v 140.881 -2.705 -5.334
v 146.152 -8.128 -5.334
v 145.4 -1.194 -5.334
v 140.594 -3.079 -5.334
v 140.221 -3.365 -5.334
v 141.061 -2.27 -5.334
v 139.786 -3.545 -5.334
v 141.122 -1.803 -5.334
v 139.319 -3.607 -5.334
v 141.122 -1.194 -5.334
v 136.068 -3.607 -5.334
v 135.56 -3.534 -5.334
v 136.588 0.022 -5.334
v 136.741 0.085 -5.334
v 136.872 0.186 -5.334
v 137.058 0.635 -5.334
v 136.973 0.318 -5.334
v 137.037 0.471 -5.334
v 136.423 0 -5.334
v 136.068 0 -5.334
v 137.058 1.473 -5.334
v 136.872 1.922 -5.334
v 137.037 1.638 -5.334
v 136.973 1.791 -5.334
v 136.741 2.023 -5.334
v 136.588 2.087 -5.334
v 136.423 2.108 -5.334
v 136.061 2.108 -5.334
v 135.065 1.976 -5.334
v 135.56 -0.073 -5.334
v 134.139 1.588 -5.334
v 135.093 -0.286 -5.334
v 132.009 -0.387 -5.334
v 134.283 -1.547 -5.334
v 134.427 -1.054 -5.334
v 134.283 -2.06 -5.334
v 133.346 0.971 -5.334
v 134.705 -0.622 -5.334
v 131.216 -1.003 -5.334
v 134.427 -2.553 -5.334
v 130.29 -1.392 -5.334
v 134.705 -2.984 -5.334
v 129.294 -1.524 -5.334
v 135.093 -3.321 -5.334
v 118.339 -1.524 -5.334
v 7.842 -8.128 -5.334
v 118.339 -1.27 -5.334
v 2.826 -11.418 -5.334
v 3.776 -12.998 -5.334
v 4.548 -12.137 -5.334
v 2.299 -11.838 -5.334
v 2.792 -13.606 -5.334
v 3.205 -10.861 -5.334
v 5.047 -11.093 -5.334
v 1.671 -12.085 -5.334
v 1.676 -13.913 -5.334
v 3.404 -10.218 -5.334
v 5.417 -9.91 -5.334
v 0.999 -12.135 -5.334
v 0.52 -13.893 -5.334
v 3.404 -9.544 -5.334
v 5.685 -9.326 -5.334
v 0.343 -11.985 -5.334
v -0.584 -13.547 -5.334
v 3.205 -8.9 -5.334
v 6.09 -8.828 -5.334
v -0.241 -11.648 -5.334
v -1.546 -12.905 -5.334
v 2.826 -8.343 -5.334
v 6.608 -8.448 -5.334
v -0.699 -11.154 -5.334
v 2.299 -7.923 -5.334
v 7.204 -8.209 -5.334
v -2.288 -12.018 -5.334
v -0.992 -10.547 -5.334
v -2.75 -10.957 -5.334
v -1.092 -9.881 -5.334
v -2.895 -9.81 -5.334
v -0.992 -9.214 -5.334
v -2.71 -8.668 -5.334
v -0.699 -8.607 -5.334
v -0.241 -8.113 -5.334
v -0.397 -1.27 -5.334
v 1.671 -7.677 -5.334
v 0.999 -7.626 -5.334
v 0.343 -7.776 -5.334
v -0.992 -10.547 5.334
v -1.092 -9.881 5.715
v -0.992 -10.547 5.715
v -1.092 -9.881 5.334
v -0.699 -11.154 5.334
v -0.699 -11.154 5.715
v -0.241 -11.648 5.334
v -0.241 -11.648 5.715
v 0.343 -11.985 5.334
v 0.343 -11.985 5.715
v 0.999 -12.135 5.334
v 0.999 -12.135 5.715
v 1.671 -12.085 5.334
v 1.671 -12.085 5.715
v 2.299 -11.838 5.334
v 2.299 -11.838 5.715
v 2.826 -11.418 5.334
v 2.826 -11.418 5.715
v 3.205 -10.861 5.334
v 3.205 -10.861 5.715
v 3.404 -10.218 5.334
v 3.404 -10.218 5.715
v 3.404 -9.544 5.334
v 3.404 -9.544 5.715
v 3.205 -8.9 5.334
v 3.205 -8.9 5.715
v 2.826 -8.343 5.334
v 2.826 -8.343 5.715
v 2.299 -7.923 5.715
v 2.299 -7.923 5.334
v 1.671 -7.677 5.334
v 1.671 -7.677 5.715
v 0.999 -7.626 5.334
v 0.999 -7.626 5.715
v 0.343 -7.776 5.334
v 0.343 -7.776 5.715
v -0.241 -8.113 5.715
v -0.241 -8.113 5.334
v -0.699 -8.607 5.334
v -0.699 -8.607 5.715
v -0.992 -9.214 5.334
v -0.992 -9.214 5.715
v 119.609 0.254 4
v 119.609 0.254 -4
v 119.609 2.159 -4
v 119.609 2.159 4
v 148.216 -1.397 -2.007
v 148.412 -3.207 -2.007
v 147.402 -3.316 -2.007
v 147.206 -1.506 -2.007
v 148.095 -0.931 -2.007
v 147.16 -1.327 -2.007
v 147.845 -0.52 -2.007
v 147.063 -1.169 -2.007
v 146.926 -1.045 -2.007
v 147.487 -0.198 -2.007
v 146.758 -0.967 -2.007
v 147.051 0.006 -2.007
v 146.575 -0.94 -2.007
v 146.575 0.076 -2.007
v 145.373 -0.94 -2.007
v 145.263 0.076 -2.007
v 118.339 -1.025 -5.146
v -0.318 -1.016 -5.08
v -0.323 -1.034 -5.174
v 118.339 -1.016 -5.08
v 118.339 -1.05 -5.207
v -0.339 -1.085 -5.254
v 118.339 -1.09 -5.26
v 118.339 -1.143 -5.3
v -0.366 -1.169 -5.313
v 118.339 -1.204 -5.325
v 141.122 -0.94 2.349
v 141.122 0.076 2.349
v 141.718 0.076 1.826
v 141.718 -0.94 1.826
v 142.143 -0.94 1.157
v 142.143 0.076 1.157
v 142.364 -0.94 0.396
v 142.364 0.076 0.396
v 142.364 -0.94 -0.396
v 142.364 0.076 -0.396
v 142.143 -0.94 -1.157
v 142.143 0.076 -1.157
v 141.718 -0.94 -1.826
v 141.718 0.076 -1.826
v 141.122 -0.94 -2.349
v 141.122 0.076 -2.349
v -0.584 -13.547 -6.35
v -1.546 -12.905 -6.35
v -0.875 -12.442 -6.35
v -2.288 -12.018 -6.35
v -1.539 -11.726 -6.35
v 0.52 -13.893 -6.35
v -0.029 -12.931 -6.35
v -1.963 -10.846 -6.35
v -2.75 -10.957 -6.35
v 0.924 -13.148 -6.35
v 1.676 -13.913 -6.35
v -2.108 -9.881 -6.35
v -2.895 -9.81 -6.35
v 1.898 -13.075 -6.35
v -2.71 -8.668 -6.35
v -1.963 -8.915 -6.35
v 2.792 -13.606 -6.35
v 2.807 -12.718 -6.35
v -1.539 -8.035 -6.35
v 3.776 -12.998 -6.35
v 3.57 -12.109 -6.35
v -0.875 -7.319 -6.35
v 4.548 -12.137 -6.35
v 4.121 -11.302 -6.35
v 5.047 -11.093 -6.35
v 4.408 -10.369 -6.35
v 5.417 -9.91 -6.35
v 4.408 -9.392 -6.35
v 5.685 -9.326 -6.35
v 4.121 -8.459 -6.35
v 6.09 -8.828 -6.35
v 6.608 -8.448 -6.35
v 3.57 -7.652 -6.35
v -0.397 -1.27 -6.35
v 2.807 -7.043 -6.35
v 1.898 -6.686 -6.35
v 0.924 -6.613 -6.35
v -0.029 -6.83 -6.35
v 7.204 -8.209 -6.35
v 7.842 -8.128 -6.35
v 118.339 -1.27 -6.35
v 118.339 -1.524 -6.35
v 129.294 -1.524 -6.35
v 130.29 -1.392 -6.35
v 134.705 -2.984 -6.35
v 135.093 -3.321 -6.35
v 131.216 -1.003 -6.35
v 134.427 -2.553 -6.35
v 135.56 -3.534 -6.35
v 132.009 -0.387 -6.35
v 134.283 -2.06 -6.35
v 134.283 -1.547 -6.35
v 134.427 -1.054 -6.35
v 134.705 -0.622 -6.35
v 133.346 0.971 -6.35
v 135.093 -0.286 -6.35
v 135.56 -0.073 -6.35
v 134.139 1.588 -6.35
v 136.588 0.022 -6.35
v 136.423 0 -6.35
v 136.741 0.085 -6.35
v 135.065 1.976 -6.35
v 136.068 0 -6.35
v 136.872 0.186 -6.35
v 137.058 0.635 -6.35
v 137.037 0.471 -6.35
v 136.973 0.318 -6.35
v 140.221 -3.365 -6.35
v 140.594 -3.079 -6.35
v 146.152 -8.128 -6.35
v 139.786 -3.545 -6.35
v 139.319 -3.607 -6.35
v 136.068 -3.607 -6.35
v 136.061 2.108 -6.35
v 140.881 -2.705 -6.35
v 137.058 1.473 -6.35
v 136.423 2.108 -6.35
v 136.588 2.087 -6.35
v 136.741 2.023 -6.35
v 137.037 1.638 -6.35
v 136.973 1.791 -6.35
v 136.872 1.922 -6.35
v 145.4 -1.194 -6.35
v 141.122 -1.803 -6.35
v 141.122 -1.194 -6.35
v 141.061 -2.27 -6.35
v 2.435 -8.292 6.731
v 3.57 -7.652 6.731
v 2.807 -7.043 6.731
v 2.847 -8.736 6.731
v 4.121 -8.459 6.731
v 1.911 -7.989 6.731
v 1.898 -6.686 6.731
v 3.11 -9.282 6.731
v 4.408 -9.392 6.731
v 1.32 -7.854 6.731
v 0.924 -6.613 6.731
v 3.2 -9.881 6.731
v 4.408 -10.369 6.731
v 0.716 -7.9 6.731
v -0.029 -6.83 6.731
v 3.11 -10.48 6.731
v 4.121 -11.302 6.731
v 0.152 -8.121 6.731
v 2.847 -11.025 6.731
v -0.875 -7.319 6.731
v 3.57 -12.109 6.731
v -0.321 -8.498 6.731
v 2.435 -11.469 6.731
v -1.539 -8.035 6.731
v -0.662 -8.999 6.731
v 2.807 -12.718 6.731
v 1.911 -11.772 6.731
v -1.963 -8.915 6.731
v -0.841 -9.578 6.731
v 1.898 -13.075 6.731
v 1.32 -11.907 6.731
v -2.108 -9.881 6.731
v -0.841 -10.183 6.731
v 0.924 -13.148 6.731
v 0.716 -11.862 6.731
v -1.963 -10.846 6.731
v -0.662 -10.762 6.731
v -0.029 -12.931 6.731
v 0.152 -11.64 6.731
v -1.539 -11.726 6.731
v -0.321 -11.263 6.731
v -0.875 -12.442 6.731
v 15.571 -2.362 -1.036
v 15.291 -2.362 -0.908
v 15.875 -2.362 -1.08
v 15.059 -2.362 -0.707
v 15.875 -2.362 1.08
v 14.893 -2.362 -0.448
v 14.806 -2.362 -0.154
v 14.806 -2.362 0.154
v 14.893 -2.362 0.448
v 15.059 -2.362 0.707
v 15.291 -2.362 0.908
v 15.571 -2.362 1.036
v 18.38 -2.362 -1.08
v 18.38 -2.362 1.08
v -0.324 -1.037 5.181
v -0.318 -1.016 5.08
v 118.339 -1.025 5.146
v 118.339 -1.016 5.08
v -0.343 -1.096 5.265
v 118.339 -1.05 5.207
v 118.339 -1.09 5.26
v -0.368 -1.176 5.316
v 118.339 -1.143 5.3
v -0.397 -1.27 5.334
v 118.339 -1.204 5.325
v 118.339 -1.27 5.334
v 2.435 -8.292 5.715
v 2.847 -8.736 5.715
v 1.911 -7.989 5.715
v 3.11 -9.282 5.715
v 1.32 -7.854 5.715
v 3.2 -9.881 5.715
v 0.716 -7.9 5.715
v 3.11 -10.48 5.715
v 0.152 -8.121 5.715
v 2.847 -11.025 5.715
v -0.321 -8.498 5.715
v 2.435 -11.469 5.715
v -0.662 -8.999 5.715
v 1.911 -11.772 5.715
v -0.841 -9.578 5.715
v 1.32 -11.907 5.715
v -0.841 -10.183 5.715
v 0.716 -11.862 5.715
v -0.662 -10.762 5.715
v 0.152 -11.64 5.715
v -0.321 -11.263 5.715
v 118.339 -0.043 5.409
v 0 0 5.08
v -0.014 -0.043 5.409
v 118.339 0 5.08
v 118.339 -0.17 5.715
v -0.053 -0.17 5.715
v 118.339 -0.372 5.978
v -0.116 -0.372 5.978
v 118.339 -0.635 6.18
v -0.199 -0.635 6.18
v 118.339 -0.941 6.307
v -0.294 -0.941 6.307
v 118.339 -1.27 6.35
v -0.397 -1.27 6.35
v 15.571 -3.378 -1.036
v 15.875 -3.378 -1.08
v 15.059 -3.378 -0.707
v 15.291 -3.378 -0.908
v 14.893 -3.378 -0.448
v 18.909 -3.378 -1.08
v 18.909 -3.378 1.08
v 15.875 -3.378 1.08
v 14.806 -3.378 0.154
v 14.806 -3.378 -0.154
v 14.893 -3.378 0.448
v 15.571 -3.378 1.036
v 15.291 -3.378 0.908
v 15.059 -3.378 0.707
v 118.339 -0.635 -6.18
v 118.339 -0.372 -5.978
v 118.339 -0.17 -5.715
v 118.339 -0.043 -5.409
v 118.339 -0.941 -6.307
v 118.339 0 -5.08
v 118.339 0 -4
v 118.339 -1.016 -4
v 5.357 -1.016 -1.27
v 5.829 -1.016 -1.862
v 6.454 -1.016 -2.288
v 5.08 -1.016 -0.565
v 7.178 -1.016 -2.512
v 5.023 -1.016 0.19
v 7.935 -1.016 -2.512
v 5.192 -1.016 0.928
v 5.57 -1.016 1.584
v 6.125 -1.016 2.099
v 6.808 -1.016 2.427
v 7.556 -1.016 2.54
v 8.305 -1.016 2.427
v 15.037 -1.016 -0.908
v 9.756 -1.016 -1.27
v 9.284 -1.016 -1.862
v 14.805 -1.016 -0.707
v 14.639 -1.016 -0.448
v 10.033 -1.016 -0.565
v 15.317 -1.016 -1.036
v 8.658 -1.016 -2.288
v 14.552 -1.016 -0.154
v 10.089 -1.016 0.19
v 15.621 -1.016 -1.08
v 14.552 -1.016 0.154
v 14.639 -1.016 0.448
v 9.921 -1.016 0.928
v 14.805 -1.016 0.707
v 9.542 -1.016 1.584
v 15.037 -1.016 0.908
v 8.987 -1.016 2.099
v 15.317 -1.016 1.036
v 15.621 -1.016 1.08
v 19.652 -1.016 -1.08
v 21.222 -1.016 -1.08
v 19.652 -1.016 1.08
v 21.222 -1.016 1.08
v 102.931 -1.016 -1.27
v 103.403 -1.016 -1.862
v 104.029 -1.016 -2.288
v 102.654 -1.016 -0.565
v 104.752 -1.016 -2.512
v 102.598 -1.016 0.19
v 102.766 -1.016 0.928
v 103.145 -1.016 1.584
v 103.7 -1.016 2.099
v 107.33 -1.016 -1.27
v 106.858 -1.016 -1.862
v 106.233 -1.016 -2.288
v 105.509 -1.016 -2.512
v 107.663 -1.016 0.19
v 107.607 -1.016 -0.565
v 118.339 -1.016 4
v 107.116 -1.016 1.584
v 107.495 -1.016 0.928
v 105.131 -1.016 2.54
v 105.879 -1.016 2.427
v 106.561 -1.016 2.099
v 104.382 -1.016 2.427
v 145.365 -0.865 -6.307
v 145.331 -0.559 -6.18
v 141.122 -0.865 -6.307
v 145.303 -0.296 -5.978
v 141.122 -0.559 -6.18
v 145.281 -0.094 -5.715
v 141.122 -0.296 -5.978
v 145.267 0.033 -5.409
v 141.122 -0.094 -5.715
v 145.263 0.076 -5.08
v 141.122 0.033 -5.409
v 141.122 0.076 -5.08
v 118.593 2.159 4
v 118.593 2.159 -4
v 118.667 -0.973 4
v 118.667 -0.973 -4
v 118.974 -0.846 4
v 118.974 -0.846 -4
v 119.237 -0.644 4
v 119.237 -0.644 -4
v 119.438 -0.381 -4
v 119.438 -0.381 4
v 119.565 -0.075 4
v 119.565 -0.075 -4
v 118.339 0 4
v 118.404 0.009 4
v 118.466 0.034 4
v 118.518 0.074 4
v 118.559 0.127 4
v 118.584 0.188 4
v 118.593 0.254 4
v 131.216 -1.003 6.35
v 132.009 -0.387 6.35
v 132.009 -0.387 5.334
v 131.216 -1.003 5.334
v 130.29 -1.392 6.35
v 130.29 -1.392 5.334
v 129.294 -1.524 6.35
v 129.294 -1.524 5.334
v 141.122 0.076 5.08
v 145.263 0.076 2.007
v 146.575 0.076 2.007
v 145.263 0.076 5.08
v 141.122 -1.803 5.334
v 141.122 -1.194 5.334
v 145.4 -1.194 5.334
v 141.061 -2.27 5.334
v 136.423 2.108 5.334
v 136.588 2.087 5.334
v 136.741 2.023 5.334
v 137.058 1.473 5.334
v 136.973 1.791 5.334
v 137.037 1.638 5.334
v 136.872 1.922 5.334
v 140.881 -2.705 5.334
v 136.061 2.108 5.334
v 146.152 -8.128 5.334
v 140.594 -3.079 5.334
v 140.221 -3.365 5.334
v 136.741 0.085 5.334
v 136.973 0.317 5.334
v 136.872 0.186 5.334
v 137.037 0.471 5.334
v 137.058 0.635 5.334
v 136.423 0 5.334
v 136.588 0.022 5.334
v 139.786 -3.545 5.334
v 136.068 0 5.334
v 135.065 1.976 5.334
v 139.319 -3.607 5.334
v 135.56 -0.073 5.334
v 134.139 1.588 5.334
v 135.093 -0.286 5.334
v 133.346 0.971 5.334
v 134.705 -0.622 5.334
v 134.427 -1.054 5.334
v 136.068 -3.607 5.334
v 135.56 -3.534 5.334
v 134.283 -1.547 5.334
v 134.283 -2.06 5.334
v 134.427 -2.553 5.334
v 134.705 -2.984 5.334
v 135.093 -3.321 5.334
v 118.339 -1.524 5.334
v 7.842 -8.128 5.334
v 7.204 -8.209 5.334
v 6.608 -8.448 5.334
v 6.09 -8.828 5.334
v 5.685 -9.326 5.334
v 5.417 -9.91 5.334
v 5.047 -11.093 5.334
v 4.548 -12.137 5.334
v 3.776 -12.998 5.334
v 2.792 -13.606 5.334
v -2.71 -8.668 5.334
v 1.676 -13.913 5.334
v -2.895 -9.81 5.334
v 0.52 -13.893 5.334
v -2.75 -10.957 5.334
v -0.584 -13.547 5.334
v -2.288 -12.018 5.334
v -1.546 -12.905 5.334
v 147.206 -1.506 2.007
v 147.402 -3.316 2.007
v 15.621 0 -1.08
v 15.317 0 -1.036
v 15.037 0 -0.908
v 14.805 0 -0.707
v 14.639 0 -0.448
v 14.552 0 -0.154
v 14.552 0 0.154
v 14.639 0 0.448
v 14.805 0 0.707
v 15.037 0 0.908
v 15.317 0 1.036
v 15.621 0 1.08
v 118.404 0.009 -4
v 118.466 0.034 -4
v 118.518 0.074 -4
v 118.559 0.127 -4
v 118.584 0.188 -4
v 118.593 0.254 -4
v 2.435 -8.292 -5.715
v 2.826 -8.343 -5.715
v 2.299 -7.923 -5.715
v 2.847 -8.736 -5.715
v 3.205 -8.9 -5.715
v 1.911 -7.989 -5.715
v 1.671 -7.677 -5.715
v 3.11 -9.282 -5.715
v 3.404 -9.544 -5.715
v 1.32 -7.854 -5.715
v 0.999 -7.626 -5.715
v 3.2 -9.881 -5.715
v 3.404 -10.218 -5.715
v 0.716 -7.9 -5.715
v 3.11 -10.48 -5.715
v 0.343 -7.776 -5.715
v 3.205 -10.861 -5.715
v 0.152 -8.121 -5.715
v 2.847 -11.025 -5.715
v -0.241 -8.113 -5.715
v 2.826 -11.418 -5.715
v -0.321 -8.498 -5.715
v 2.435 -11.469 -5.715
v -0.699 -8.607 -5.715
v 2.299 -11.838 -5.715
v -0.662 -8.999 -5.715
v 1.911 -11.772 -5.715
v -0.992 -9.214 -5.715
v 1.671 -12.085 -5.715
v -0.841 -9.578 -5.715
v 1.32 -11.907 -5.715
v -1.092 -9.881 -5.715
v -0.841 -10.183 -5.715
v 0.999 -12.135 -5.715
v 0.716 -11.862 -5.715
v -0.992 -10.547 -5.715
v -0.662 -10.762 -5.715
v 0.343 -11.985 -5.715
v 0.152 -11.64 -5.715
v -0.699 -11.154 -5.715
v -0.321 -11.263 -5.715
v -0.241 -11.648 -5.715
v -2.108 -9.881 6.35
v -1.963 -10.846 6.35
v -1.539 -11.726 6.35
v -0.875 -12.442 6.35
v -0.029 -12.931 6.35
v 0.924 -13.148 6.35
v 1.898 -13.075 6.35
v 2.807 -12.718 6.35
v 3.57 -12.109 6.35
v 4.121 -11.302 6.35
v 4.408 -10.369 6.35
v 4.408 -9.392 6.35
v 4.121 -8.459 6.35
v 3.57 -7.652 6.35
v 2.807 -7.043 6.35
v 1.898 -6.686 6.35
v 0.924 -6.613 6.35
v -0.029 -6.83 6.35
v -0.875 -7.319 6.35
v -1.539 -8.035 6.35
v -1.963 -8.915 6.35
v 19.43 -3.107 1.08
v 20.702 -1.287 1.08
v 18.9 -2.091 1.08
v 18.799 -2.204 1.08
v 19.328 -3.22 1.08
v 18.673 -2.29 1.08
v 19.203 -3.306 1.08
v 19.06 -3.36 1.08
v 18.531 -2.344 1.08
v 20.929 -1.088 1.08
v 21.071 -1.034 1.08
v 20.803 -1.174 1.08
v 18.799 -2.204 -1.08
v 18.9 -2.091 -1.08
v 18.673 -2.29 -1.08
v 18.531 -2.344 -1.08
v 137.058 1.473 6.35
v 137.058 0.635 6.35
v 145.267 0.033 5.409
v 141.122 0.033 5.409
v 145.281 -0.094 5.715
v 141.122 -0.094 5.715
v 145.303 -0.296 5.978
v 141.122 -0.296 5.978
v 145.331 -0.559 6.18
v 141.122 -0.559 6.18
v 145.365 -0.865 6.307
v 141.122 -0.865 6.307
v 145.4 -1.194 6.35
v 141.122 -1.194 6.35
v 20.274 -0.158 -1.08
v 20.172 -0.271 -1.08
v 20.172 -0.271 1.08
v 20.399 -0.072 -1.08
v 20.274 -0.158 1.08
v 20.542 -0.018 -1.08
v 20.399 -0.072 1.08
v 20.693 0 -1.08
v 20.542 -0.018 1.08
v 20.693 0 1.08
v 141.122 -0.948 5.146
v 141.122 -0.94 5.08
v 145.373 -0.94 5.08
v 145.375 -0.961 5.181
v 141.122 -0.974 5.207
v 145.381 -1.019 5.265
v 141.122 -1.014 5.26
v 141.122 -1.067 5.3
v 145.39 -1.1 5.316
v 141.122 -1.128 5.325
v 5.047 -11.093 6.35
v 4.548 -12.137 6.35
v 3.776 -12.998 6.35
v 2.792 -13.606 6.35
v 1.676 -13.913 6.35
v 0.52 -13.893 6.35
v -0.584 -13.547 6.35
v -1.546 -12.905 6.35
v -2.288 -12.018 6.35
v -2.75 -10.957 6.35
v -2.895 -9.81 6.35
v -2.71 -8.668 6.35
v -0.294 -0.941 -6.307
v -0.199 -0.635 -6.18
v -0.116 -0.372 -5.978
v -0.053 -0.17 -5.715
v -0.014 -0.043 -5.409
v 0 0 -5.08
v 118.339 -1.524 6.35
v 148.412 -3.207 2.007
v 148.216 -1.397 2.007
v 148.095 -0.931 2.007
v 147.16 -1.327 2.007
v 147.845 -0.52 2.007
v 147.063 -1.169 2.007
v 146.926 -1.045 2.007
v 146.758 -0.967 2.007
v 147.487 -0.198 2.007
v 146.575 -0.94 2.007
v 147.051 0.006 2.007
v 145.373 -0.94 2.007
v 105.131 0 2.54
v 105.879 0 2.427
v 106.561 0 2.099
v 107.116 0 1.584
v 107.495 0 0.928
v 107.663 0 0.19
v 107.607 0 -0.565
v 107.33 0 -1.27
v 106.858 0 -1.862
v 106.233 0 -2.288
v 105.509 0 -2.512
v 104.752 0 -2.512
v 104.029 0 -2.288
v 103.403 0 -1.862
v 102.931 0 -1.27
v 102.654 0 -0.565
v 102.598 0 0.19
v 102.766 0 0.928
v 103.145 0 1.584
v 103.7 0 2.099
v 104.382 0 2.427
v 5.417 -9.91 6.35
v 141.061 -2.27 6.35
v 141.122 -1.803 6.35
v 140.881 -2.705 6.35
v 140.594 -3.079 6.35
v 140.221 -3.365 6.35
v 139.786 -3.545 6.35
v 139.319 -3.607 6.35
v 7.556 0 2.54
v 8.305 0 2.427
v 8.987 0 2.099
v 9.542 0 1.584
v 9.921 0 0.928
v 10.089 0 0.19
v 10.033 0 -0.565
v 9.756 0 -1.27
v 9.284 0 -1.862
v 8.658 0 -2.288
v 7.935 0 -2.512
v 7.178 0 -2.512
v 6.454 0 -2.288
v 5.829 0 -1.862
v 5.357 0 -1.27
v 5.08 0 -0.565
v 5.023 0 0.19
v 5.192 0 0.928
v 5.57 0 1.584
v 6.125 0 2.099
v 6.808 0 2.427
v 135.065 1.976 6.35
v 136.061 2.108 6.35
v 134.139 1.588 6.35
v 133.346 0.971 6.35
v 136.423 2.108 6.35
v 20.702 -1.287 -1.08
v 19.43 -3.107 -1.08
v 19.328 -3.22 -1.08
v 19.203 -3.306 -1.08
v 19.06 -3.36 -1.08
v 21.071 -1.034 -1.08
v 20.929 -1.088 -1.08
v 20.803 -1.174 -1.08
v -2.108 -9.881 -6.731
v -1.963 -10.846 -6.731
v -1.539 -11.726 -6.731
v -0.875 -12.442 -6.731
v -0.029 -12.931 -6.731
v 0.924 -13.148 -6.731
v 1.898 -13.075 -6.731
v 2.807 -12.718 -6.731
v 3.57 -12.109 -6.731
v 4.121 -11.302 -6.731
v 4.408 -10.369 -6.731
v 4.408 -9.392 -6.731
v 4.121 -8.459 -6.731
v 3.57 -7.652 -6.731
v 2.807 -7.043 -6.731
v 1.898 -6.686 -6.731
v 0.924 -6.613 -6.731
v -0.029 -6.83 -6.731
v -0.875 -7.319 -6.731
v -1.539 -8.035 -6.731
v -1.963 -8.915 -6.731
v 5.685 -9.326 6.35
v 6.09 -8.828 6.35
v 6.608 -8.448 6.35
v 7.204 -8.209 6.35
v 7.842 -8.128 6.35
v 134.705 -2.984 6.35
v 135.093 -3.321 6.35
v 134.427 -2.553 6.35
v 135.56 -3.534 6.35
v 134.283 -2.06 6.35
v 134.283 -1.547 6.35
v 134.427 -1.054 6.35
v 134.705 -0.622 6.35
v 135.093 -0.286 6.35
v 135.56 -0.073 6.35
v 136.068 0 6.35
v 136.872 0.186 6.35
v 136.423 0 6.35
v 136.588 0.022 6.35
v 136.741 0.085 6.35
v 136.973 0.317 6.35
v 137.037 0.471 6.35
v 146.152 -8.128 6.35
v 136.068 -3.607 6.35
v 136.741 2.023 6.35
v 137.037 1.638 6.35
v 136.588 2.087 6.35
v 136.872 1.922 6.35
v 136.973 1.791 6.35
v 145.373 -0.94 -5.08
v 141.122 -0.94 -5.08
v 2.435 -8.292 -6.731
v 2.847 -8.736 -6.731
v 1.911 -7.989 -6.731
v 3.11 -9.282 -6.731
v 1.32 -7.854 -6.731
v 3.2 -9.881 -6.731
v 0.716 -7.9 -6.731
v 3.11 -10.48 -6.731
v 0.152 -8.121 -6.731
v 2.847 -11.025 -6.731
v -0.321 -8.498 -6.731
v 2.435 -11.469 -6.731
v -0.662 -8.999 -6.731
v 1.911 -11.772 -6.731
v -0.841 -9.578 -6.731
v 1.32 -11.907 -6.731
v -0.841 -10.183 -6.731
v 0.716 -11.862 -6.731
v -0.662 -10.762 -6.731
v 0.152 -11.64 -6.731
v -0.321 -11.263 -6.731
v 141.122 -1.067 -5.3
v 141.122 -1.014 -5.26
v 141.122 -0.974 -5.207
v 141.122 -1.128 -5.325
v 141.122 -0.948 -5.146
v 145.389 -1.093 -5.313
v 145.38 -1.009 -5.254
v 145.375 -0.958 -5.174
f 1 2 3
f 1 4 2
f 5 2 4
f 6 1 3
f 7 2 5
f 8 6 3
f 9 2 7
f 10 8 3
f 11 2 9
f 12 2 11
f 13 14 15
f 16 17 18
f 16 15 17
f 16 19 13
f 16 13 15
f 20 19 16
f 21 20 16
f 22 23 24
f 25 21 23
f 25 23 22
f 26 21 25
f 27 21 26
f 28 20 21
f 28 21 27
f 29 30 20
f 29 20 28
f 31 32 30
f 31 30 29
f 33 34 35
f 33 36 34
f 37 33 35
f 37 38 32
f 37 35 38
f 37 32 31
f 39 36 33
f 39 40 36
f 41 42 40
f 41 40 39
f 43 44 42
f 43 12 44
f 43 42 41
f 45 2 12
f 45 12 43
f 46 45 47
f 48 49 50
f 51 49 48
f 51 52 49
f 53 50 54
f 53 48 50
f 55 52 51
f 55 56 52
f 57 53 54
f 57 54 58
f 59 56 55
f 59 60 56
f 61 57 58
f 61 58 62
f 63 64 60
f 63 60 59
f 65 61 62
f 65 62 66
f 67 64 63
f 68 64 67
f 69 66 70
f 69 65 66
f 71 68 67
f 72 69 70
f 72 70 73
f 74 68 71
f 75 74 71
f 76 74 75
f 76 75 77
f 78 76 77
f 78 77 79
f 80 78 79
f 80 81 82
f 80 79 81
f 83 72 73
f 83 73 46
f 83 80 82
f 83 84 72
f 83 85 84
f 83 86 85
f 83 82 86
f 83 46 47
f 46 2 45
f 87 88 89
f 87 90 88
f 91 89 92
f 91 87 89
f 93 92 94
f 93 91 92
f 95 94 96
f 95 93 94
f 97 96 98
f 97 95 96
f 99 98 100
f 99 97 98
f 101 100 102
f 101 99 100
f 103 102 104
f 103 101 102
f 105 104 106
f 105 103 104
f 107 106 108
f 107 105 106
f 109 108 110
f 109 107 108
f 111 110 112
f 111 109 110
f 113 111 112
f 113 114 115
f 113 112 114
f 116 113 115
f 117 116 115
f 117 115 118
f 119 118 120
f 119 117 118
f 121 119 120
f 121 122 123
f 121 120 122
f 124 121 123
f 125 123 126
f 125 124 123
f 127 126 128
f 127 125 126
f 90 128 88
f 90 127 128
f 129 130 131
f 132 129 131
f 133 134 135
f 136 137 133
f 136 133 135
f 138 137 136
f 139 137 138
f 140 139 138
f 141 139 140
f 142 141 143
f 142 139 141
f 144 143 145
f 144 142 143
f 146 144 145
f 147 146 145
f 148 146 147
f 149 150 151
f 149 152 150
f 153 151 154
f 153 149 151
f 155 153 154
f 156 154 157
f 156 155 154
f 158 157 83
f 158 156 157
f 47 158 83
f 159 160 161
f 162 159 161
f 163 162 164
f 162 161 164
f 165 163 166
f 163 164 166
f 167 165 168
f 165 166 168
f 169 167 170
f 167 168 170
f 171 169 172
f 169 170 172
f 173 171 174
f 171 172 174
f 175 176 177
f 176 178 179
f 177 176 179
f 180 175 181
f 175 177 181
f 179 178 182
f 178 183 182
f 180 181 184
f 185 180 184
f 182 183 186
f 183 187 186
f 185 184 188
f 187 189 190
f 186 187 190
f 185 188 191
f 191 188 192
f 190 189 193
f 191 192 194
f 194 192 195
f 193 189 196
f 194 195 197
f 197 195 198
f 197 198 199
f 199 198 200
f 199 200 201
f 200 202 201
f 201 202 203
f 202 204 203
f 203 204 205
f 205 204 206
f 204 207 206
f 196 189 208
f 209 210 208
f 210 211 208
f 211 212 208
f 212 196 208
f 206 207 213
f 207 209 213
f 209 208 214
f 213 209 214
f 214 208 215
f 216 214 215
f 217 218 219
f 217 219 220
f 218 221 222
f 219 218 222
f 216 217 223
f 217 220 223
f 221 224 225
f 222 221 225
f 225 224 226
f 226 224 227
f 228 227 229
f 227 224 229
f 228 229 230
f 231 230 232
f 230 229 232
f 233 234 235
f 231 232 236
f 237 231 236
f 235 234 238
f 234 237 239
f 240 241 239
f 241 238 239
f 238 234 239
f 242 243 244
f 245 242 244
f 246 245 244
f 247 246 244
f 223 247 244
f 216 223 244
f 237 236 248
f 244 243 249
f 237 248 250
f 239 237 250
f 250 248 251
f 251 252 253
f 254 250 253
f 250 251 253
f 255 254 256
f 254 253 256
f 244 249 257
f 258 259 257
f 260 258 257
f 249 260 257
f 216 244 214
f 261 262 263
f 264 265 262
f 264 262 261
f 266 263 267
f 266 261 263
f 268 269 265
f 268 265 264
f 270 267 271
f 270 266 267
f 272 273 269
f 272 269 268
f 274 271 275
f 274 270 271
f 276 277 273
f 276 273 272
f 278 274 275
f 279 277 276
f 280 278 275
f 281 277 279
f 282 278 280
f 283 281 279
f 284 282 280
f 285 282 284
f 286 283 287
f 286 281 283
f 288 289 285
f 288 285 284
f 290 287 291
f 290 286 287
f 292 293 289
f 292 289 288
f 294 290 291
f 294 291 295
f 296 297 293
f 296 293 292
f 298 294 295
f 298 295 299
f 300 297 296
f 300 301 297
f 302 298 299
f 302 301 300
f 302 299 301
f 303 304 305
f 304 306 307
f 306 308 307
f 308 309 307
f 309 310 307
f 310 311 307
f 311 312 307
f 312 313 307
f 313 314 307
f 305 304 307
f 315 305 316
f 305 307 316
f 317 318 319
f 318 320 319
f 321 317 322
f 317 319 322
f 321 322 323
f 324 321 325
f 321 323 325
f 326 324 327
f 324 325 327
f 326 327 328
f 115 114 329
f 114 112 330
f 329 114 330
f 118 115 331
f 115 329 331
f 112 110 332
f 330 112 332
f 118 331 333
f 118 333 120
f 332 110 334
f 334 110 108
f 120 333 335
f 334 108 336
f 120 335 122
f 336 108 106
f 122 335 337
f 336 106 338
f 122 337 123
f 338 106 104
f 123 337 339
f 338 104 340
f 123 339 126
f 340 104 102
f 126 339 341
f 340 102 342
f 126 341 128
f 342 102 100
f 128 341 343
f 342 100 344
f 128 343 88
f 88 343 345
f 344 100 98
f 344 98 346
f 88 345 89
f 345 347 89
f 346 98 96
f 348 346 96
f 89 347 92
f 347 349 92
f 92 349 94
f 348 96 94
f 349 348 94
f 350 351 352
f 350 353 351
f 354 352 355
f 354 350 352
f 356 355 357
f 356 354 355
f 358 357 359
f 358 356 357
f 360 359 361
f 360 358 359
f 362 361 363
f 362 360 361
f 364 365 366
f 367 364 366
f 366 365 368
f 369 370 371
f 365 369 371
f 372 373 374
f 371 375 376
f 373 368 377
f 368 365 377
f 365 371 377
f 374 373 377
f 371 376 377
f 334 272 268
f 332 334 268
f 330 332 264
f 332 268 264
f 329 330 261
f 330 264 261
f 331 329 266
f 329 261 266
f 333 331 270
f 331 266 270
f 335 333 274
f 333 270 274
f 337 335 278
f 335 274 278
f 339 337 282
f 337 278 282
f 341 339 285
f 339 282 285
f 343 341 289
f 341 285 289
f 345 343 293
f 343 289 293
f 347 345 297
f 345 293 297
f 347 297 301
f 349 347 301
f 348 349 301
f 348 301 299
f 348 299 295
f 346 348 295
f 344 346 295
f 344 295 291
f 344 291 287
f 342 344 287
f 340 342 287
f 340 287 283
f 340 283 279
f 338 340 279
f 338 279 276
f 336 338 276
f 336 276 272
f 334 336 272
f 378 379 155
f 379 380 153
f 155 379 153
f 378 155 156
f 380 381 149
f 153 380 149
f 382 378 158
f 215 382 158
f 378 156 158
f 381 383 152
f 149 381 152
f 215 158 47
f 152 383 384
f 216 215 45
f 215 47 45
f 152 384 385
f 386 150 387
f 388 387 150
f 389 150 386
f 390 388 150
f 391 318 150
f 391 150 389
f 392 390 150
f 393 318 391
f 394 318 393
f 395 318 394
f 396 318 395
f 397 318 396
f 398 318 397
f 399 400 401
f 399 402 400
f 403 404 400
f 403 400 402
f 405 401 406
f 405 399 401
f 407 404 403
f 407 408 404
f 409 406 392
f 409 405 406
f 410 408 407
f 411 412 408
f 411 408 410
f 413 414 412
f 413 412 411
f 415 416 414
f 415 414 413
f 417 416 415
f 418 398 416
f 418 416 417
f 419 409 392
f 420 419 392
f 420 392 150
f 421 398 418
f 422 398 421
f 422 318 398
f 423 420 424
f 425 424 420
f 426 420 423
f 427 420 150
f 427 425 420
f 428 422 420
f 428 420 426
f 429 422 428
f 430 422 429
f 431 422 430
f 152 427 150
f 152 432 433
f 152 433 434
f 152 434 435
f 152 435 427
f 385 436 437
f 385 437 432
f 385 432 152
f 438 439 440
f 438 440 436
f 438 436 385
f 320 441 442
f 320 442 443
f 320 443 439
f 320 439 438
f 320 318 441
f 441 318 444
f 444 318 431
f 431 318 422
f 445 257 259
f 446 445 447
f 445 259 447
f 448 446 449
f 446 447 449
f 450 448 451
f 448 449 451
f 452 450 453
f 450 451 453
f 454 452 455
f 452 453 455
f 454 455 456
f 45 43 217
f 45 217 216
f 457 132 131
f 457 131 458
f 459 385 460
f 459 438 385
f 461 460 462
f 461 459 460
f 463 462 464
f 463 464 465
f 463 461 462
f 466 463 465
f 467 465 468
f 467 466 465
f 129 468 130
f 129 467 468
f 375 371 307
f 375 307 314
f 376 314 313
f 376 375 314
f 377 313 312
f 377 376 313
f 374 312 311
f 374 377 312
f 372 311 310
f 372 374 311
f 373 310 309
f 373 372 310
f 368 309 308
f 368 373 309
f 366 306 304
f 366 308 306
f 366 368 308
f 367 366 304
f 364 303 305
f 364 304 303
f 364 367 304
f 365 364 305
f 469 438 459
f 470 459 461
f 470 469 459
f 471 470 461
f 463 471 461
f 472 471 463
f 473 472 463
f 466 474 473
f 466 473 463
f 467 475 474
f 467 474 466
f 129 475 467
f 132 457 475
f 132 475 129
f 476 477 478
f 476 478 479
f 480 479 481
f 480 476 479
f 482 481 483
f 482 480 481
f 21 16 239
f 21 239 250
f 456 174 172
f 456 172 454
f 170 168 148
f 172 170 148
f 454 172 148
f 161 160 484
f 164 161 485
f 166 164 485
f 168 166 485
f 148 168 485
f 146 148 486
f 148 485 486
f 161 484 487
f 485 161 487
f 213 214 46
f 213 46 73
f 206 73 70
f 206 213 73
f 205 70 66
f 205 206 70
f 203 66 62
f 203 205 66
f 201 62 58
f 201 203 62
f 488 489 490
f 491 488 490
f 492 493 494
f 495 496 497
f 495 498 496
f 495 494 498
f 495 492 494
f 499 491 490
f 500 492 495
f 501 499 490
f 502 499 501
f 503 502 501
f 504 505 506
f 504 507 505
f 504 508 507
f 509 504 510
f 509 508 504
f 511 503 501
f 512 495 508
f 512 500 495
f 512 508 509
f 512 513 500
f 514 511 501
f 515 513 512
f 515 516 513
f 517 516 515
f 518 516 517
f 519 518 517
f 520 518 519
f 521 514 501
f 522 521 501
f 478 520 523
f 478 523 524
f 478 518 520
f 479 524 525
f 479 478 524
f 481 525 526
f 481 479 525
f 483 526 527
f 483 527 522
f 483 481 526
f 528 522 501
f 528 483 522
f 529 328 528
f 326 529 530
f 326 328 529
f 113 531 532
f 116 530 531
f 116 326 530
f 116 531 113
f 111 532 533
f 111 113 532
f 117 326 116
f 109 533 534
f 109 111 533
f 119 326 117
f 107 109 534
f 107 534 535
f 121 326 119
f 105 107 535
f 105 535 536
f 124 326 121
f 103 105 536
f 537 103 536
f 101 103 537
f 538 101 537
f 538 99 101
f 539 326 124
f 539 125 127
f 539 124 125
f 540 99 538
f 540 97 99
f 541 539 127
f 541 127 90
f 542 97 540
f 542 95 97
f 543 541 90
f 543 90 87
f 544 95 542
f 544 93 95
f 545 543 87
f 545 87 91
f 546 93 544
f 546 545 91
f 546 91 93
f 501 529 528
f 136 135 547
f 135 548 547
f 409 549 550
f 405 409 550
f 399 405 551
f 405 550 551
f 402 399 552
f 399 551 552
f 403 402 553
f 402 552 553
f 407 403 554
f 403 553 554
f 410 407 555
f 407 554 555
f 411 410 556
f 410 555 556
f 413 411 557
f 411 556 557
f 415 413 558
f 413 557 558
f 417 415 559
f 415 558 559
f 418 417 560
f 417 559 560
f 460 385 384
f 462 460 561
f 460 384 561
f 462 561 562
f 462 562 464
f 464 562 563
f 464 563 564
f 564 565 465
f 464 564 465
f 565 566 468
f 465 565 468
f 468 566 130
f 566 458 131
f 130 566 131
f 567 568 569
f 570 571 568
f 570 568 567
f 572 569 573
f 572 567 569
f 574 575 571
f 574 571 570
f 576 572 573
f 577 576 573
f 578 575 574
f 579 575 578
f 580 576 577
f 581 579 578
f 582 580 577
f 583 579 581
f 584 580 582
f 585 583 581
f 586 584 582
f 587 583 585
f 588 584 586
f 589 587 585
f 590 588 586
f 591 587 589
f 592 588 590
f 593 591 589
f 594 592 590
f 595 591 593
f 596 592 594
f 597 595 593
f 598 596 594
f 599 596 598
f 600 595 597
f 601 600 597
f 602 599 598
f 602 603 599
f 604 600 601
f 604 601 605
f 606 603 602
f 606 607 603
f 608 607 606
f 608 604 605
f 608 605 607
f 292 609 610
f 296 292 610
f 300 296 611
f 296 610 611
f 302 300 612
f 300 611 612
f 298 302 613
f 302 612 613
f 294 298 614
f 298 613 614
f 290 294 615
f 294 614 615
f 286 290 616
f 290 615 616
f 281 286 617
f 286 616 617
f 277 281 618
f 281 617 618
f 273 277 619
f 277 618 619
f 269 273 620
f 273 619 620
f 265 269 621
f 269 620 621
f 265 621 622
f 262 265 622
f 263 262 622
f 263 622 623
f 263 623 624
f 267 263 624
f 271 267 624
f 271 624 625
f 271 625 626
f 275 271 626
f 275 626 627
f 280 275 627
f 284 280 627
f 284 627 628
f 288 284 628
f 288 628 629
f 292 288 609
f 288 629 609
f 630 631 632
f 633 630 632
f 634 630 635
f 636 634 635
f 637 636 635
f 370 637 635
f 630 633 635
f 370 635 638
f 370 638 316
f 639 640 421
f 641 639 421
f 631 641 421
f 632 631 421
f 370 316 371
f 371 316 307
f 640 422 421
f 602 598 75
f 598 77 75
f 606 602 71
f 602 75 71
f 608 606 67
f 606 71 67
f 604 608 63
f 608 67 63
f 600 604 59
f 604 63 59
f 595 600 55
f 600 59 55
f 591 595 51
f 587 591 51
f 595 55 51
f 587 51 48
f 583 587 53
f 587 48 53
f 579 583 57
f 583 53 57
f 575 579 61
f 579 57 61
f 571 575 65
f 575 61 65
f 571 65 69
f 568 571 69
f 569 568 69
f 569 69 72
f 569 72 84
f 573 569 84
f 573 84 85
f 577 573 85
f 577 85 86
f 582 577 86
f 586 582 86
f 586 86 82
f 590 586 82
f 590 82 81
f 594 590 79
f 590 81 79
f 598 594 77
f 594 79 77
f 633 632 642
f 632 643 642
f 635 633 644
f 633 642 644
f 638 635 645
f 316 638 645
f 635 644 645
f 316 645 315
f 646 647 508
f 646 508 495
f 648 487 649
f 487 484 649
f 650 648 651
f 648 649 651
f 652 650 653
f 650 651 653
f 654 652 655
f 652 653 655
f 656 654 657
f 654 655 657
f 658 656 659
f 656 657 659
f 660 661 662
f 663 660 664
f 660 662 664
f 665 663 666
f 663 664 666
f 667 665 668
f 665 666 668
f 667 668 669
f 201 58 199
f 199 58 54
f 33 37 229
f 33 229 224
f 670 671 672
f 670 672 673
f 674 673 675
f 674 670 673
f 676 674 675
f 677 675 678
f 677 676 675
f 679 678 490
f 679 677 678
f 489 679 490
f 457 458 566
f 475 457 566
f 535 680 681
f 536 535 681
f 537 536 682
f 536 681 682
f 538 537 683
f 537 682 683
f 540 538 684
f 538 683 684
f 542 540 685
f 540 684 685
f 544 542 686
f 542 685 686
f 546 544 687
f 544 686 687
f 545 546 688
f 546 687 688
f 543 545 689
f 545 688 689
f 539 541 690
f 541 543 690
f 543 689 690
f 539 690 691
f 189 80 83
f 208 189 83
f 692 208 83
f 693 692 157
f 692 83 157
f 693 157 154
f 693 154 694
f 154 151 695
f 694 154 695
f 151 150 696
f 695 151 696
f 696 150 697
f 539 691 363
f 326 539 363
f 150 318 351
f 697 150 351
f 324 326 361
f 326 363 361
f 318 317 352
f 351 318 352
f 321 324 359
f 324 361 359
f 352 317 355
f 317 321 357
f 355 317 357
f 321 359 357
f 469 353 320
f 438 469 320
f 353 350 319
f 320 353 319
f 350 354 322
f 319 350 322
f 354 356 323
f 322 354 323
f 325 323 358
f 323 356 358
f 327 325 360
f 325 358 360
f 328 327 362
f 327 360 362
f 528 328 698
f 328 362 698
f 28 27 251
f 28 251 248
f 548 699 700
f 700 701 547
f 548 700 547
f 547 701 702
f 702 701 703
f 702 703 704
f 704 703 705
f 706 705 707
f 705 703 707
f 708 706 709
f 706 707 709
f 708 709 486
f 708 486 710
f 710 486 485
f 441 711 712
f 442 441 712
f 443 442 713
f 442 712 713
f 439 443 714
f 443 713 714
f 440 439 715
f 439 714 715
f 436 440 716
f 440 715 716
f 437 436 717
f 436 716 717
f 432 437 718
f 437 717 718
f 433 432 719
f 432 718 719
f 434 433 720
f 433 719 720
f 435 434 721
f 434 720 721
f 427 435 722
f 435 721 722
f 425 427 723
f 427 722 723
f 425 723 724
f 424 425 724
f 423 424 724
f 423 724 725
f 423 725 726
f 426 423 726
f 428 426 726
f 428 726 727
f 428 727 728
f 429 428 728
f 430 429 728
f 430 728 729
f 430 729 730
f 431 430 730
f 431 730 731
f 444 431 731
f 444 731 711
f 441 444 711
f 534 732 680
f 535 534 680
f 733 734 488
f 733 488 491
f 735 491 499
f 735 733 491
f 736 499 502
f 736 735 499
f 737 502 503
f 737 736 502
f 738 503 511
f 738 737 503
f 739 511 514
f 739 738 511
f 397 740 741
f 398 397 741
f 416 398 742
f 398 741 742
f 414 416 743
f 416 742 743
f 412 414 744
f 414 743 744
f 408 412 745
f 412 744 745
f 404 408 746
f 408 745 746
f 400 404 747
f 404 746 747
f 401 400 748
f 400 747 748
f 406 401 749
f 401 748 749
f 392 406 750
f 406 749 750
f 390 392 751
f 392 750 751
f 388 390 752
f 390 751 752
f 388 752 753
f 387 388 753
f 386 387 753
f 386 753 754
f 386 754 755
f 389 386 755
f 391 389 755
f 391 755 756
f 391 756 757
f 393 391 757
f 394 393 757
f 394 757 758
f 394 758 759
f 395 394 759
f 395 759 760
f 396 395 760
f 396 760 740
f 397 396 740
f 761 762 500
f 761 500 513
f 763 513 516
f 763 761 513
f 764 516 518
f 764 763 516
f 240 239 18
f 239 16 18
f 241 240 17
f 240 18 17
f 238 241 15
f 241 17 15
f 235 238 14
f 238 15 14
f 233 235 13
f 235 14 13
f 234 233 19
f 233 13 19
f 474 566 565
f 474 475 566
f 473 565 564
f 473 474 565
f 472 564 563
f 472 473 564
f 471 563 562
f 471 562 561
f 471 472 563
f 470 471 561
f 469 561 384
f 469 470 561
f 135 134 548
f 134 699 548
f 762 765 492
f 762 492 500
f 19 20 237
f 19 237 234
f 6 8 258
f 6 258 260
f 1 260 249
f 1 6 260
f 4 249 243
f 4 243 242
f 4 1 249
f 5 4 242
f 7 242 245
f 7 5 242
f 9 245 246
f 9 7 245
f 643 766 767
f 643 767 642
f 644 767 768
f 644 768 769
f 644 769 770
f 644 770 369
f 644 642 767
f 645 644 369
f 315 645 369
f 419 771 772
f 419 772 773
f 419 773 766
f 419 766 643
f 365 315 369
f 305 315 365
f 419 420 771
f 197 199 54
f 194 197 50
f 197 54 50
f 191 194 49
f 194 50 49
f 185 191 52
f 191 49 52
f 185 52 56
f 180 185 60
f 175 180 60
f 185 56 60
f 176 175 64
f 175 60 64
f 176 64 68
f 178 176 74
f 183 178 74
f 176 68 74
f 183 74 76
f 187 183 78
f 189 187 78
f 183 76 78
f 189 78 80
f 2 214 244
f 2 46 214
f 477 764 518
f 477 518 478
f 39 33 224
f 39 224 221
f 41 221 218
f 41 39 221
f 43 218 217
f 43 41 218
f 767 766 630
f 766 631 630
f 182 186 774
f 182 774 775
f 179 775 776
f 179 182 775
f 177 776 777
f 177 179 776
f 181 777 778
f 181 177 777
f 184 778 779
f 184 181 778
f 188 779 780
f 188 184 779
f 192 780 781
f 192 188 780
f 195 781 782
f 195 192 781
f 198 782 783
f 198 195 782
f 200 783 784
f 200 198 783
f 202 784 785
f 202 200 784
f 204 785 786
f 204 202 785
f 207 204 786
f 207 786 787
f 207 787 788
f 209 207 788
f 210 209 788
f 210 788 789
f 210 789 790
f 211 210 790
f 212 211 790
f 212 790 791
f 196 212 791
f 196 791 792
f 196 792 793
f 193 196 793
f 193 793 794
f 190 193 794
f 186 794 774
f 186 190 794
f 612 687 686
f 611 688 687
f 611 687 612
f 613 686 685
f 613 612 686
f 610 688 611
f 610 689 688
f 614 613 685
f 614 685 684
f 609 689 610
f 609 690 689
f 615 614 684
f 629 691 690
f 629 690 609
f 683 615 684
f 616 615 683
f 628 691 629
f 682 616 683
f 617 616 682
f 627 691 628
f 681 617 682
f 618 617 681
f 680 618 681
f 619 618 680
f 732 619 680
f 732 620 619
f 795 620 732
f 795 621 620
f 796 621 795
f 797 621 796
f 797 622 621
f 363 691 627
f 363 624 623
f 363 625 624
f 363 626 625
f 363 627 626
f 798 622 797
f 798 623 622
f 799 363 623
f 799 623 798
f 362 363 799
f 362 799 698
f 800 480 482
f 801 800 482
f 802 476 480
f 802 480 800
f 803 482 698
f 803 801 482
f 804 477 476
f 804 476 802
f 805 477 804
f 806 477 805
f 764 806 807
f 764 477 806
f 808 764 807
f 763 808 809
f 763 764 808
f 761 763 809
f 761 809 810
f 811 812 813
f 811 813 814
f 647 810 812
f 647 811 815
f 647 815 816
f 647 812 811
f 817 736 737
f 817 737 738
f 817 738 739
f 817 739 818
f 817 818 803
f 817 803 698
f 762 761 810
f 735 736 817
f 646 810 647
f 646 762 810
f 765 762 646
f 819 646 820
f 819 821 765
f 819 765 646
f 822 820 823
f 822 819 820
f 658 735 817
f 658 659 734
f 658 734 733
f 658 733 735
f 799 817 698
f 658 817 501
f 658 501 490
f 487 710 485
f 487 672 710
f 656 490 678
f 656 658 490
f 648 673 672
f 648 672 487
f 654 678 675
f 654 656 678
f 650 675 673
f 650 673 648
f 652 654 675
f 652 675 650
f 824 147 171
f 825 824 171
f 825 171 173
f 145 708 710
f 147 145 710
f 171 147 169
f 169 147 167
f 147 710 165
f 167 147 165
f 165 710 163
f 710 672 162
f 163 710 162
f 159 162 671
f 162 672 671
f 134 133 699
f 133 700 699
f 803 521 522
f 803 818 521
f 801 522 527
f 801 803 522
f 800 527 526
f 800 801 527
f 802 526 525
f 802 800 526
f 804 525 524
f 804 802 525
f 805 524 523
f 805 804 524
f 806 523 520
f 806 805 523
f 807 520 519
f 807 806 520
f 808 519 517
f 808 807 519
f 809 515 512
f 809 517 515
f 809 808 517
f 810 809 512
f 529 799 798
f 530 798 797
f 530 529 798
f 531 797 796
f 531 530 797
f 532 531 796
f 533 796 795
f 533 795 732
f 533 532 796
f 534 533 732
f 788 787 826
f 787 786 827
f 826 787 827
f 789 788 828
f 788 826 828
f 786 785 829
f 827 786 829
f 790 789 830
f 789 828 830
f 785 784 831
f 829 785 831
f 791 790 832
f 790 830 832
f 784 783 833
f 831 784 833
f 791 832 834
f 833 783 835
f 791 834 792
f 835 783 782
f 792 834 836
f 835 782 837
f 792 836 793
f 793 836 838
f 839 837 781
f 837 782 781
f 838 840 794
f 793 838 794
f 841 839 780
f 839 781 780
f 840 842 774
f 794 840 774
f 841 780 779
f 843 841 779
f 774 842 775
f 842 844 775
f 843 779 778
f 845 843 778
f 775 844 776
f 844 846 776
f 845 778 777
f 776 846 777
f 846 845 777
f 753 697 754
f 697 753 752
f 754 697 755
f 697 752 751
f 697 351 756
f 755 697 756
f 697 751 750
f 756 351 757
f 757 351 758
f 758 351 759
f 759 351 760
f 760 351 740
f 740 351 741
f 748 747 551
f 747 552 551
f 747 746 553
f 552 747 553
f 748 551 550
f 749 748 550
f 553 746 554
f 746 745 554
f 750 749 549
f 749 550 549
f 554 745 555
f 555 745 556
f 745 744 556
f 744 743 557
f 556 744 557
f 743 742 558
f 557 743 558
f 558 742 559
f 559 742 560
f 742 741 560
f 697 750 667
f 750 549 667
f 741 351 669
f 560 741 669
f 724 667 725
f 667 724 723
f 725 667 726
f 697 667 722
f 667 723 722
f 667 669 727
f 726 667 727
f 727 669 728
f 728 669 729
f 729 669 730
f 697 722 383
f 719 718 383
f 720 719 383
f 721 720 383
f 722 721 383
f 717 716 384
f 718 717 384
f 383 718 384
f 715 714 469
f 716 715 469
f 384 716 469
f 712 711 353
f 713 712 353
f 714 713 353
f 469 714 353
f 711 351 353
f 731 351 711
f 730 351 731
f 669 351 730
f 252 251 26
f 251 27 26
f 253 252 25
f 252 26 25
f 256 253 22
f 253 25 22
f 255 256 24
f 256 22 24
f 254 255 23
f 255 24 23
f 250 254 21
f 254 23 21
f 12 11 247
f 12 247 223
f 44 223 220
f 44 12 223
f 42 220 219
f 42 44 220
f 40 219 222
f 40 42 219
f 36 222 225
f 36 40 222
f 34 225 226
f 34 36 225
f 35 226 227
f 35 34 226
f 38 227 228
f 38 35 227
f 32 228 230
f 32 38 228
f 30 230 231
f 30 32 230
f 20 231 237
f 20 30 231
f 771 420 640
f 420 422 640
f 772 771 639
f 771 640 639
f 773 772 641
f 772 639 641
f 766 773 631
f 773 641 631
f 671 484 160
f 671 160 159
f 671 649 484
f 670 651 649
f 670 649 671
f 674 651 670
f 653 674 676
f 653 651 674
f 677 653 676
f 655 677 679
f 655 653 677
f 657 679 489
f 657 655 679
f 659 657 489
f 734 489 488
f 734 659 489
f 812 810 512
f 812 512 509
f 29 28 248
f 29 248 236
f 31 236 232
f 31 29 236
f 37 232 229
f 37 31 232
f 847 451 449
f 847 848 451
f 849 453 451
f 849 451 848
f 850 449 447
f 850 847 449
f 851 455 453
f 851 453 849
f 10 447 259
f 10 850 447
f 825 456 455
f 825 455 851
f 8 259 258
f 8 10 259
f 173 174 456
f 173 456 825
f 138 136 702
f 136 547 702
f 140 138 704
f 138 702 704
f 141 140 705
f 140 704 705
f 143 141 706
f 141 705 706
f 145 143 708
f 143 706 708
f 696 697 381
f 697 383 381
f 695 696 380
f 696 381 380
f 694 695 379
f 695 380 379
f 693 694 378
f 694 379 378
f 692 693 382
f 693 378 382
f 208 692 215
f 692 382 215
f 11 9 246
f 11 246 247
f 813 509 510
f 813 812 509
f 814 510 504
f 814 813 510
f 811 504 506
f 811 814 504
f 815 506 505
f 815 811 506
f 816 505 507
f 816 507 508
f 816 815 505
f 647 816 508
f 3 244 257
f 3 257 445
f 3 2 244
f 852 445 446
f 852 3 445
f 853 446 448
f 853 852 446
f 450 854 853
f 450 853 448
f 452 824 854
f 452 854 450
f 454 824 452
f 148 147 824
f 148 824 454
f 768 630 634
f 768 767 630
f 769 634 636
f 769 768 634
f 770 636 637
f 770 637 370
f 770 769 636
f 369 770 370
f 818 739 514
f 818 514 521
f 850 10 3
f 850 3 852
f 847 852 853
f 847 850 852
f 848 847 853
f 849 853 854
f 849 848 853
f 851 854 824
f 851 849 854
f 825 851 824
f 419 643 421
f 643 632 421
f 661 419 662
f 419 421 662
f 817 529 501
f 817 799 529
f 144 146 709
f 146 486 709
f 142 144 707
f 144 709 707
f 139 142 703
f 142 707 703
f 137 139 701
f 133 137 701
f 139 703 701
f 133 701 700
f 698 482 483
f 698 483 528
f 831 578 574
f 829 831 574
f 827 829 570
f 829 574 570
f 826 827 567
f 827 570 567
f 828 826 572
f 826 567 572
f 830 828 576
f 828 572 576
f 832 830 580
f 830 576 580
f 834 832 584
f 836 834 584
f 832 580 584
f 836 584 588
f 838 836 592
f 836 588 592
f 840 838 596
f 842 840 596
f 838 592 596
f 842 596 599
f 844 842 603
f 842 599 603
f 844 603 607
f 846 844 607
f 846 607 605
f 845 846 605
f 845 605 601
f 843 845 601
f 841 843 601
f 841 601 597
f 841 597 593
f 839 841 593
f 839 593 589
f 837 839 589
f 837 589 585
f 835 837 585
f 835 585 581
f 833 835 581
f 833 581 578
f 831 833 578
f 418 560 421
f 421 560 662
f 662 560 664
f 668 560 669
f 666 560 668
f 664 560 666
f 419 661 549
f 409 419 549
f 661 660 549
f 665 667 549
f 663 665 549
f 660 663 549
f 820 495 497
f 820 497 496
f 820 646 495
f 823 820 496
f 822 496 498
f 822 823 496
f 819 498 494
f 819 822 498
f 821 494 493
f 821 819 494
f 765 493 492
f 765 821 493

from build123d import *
from OCP.BRepFilletAPI import BRepFilletAPI_MakeFillet

# Parameters (mm, degrees)
BOSS_EXTRUDE1_DEPTH = 6.35
SKETCH2_R           = 3.2766
BOSS_EXTRUDE2_DEPTH = 0.381
FILLET1_R1          = 1.27
FILLET1_R2          = 2.54
SHELL1_T            = -1.016
BOSS_EXTRUDE3_DEPTH = 6.35
FILLET2_R           = 1.27
SHELL2_START        = 118.3386
SHELL2_DEPTH        = 27.813
SHELL2_START_2      = 129.293990182
SHELL2_2_DEPTH      = 7.764409818
FILLET3_R           = 0.635
SKETCH4_R           = 2.032
CUT_EXTRUDE1_DEPTH  = 148.431229717
EXTRUDE_THIN1_DEPTH = 2.0066
CUT_EXTRUDE2_DEPTH  = 150.225017324
EXTRUDE_THIN2_DEPTH = 4.0005
SKETCH8_R           = 2.54
CUT_EXTRUDE3_DEPTH  = 150.217877052
EXTRUDE_THIN3_DEPTH = 1.0795
FILLET4_R           = 0.635
FILLET6_RADIUS      = 1.0795
FILLET6_LENGTH      = 1.016


# Read off the part's stored shape, not the designer's step: Shell2
with BuildPart() as part:
    # Sketch1 → Boss-Extrude1 (new, symmetric)
    with BuildSketch(Plane.XY):
        with BuildLine():
            Line((0, 0), (118.3386, 0))
            Line((118.3386, 0), (118.3386, -8.128))
            Line((118.3386, -8.128), (5.974494608, -8.128))
            Line((5.974494608, -8.128), (5.047186378, -11.093494156))
            ThreePointArc((5.047186378, -11.093494156), (-0.044494156, -13.759386378), (-2.710386378, -8.667705844))
            Line((-2.710386378, -8.667705844), (0, 0))
        make_face()
    extrude(amount=BOSS_EXTRUDE1_DEPTH, both=True)

    # Sketch2 → Boss-Extrude2 (add)
    with BuildSketch(Plane.XY.offset(6.35)):
        with Locations(Location((1.1684, -9.8806, 0), (0, 0, 180))):
            Circle(SKETCH2_R)
    boss_extrude2 = extrude(amount=BOSS_EXTRUDE2_DEPTH)

    # Mirror1: Boss-Extrude2 across plane
    add(boss_extrude2.mirror(Plane.XY))

    # Fillet1: one fillet with a radius per group of edges: ONE call of the kernel's fillet builder (fillet() takes one radius for all edges)
    fillet1_edges_1 = [part.edges().sort_by_distance(p)[0] for p in [
        (59.1693, 0, 6.35),
        (59.1693, 0, -6.35),
    ]]
    fillet1_edges_2 = [part.edges().sort_by_distance(p)[0] for p in [
        (5.974494608, -8.128, 0),
    ]]
    fillet1 = BRepFilletAPI_MakeFillet(part.part.solid().wrapped)
    for e in fillet1_edges_1:
        fillet1.Add(FILLET1_R1, e.wrapped)
    for e in fillet1_edges_2:
        fillet1.Add(FILLET1_R2, e.wrapped)
    add(Compound.cast(fillet1.Shape()), mode=Mode.REPLACE)

    # Shell1
    shell1_openings = [part.faces().sort_by_distance(p)[0] for p in [
        (118.3386, -4.089523172, 0),
        (63.090062087, -8.128, 0),
        (5.232234532, -10.501717654, 0),
        (-0.044494156, -13.759386378, 0),
        (-1.363208192, -4.359484576, 0),
        (6.337175389, -8.621408996, 0),
    ]]
    offset(amount=SHELL1_T, openings=shell1_openings, kind=Kind.INTERSECTION)

    # Sketch3 → Boss-Extrude3 (add, symmetric)
    with BuildSketch(Plane.XY):
        with BuildLine():
            Line((118.3386, -8.128), (146.1516, -8.128))
            Line((146.1516, -8.128), (145.2626, 0.0762))
            Line((145.2626, 0.0762), (141.1224, 0.0762))
            Line((141.1224, 0.0762), (141.1224, -1.8034))
            ThreePointArc((141.1224, -1.8034), (140.594196369, -3.078596369), (139.319, -3.6068))
            Line((139.319, -3.6068), (136.0678, -3.6068))
            ThreePointArc((136.0678, -3.6068), (134.2644, -1.8034), (136.0678, 0))
            Line((136.0678, 0), (137.0584, 0))
            Line((137.0584, 0), (137.0584, 2.1082))
            Line((137.0584, 2.1082), (136.060885789, 2.1082))
            ThreePointArc((136.060885789, 2.1082), (134.588974152, 1.812396371), (133.345617268, 0.97091713))
            Line((133.345617268, 0.97091713), (132.009258703, -0.38671713))
            ThreePointArc((132.009258703, -0.38671713), (130.765901819, -1.228196371), (129.293990182, -1.524))
            Line((129.293990182, -1.524), (118.3386, -1.524))
            Line((118.3386, -1.524), (118.3386, -8.128))
        make_face()
    extrude(amount=BOSS_EXTRUDE3_DEPTH, both=True)

    # Fillet2
    fillet2_edges = [part.edges().sort_by_distance(p)[0] for p in [
        (143.1925, 0.0762, -6.35),
        (143.1925, 0.0762, 6.35),
    ]]
    fillet(fillet2_edges, radius=FILLET2_R)

    # Shell2 outline → Shell2 (cut)
    with BuildSketch(Plane.YZ.offset(SHELL2_START)):
        with BuildLine():
            Line((-8.128, 5.334), (-8.128, -5.334))
            Line((-8.128, -5.334), (-1.1938, -5.334))
            ThreePointArc((-1.1938, -5.334), (-1.014194878, -5.259605122), (-0.9398, -5.08))
            Line((-0.9398, -5.08), (-0.9398, 5.08))
            ThreePointArc((-0.9398, 5.08), (-1.014194878, 5.259605122), (-1.1938, 5.334))
            Line((-1.1938, 5.334), (-8.128, 5.334))
        make_face()
    extrude(amount=SHELL2_DEPTH, mode=Mode.SUBTRACT)

    # Shell2 2 outline → Shell2 2 (cut)
    with BuildSketch(Plane.YZ.offset(SHELL2_START_2)):
        with BuildLine():
            ThreePointArc((-1.1938, 5.334), (-1.014194878, 5.259605122), (-0.9398, 5.08))
            Line((-0.9398, 5.08), (-0.9398, -5.08))
            ThreePointArc((-0.9398, -5.08), (-1.014194878, -5.259605122), (-1.1938, -5.334))
            Line((-1.1938, -5.334), (2.1082, -5.334))
            Line((2.1082, -5.334), (2.1082, 5.334))
            Line((2.1082, 5.334), (-1.1938, 5.334))
        make_face()
    extrude(amount=SHELL2_2_DEPTH, mode=Mode.SUBTRACT)

    # Fillet3
    fillet3_edges = [part.edges().sort_by_distance(p)[0] for p in [
        (137.0584, 2.1082, -5.842),
        (137.0584, 0, -5.842),
        (137.0584, 0, 5.842),
        (137.0584, 2.1082, 5.842),
    ]]
    fillet(fillet3_edges, radius=FILLET3_R)

    # Sketch4 → Cut-Extrude1 (cut, through all)
    with BuildSketch(Plane.XY.offset(6.731)):
        with Locations((1.1684, -9.8806)):
            Circle(SKETCH4_R)
    extrude(amount=-CUT_EXTRUDE1_DEPTH, mode=Mode.SUBTRACT)

    # Sketch5 → Extrude-Thin1 (add, symmetric)
    with BuildSketch(Plane.XY):
        with BuildLine():
            Line((145.2626, 0.0762), (146.574836441, 0.0762))
            ThreePointArc((146.574836441, 0.0762), (147.677595365, -0.346091835), (148.216228196, -1.396940212))
            Line((148.216228196, -1.396940212), (148.412319576, -3.206583512))
            Line((148.412319576, -3.206583512), (147.402232341, -3.316035689))
            Line((147.402232341, -3.316035689), (147.206140962, -1.506392389))
            ThreePointArc((147.206140962, -1.506392389), (146.998974488, -1.102219937), (146.574836441, -0.9398))
            Line((146.574836441, -0.9398), (145.2626, -0.9398))
            Line((145.2626, -0.9398), (145.2626, 0.0762))
        make_face()
    extrude(amount=EXTRUDE_THIN1_DEPTH, both=True)

    # Sketch6 → Cut-Extrude2 (cut, through all)
    with BuildSketch(Plane(origin=(0, 0.0762, 0), x_dir=(1, 0, 0), z_dir=(0, 1, 0))):
        with BuildLine():
            Line((141.1224, 2.3495), (141.1224, -2.3495))
            ThreePointArc((141.1224, -2.3495), (142.3924, 0), (141.1224, 2.3495))
        make_face()
    extrude(amount=-CUT_EXTRUDE2_DEPTH, mode=Mode.SUBTRACT)

    # Sketch7 → Extrude-Thin2 (add, symmetric)
    with BuildSketch(Plane.XY):
        with BuildLine():
            ThreePointArc((118.3386, -1.016), (119.236625612, -0.644025612), (119.6086, 0.254))
            Line((119.6086, 0.254), (119.6086, 2.159))
            Line((119.6086, 2.159), (118.5926, 2.159))
            Line((118.5926, 2.159), (118.5926, 0.254))
            ThreePointArc((118.5926, 0.254), (118.518205122, 0.074394878), (118.3386, 0))
            Line((118.3386, 0), (118.3386, -1.016))
        make_face()
    extrude(amount=EXTRUDE_THIN2_DEPTH, both=True)

    # Sketch8 → Cut-Extrude3 (cut, through all)
    with BuildSketch(Plane(origin=(0, 0, 0), x_dir=(1, 0, 0), z_dir=(0, 1, 0))):
        with Locations(Location((7.556297414, 0, 0), (0, 0, 270))):
            Circle(SKETCH8_R)
        with Locations(Location((105.1306, 0, 0), (0, 0, 270))):
            Circle(SKETCH8_R)
        with BuildLine():
            Line((20.891297414, -1.0795), (20.891297414, 1.0795))
            Line((20.891297414, 1.0795), (15.620797414, 1.0795))
            ThreePointArc((15.620797414, 1.0795), (14.541297414, 0), (15.620797414, -1.0795))
            Line((15.620797414, -1.0795), (20.891297414, -1.0795))
        make_face()
    extrude(amount=-CUT_EXTRUDE3_DEPTH, mode=Mode.SUBTRACT)

    # Sketch9 → Extrude-Thin3 (add, symmetric)
    with BuildSketch(Plane.XY):
        Polygon((21.907297414, -1.016), (20.891297414, -1.016), (19.240297016, -3.3782), (14.795297016, -3.3782), (14.795297016, -2.3622), (18.710844734, -2.3622), (20.361845133, 0), (21.907297414, 0), align=None)
    extrude(amount=EXTRUDE_THIN3_DEPTH, both=True)

    # Fillet4
    fillet4_edges = [part.edges().sort_by_distance(p)[0] for p in [
        (20.891297414, -1.016, 0),
        (18.710844734, -2.3622, 0),
        (19.240297016, -3.3782, 0),
        (20.361845133, 0, 0),
    ]]
    fillet(fillet4_edges, radius=FILLET4_R)

    # Fillet6: full round fillet: the end face becomes a half cylinder, R = half its width
    fillet6_face = Plane((14.795297016, -2.8702, 0), x_dir=(0, -1, 0), z_dir=(-1, 0, 0))  # on the end face: x along it, z out of the body
    fillet6_slab = fillet6_face.offset(-FILLET6_RADIUS / 2) * Box(FILLET6_LENGTH, 2 * FILLET6_RADIUS, FILLET6_RADIUS, mode=Mode.PRIVATE)  # the body's end, R deep
    fillet6_round = Plane((15.874797016, -2.8702, 0), x_dir=(-1, 0, 0), z_dir=(0, -1, 0)) * Cylinder(FILLET6_RADIUS, FILLET6_LENGTH, mode=Mode.PRIVATE)  # its axis R under the face
    add(fillet6_slab - fillet6_round, mode=Mode.SUBTRACT)


solid = part.part
